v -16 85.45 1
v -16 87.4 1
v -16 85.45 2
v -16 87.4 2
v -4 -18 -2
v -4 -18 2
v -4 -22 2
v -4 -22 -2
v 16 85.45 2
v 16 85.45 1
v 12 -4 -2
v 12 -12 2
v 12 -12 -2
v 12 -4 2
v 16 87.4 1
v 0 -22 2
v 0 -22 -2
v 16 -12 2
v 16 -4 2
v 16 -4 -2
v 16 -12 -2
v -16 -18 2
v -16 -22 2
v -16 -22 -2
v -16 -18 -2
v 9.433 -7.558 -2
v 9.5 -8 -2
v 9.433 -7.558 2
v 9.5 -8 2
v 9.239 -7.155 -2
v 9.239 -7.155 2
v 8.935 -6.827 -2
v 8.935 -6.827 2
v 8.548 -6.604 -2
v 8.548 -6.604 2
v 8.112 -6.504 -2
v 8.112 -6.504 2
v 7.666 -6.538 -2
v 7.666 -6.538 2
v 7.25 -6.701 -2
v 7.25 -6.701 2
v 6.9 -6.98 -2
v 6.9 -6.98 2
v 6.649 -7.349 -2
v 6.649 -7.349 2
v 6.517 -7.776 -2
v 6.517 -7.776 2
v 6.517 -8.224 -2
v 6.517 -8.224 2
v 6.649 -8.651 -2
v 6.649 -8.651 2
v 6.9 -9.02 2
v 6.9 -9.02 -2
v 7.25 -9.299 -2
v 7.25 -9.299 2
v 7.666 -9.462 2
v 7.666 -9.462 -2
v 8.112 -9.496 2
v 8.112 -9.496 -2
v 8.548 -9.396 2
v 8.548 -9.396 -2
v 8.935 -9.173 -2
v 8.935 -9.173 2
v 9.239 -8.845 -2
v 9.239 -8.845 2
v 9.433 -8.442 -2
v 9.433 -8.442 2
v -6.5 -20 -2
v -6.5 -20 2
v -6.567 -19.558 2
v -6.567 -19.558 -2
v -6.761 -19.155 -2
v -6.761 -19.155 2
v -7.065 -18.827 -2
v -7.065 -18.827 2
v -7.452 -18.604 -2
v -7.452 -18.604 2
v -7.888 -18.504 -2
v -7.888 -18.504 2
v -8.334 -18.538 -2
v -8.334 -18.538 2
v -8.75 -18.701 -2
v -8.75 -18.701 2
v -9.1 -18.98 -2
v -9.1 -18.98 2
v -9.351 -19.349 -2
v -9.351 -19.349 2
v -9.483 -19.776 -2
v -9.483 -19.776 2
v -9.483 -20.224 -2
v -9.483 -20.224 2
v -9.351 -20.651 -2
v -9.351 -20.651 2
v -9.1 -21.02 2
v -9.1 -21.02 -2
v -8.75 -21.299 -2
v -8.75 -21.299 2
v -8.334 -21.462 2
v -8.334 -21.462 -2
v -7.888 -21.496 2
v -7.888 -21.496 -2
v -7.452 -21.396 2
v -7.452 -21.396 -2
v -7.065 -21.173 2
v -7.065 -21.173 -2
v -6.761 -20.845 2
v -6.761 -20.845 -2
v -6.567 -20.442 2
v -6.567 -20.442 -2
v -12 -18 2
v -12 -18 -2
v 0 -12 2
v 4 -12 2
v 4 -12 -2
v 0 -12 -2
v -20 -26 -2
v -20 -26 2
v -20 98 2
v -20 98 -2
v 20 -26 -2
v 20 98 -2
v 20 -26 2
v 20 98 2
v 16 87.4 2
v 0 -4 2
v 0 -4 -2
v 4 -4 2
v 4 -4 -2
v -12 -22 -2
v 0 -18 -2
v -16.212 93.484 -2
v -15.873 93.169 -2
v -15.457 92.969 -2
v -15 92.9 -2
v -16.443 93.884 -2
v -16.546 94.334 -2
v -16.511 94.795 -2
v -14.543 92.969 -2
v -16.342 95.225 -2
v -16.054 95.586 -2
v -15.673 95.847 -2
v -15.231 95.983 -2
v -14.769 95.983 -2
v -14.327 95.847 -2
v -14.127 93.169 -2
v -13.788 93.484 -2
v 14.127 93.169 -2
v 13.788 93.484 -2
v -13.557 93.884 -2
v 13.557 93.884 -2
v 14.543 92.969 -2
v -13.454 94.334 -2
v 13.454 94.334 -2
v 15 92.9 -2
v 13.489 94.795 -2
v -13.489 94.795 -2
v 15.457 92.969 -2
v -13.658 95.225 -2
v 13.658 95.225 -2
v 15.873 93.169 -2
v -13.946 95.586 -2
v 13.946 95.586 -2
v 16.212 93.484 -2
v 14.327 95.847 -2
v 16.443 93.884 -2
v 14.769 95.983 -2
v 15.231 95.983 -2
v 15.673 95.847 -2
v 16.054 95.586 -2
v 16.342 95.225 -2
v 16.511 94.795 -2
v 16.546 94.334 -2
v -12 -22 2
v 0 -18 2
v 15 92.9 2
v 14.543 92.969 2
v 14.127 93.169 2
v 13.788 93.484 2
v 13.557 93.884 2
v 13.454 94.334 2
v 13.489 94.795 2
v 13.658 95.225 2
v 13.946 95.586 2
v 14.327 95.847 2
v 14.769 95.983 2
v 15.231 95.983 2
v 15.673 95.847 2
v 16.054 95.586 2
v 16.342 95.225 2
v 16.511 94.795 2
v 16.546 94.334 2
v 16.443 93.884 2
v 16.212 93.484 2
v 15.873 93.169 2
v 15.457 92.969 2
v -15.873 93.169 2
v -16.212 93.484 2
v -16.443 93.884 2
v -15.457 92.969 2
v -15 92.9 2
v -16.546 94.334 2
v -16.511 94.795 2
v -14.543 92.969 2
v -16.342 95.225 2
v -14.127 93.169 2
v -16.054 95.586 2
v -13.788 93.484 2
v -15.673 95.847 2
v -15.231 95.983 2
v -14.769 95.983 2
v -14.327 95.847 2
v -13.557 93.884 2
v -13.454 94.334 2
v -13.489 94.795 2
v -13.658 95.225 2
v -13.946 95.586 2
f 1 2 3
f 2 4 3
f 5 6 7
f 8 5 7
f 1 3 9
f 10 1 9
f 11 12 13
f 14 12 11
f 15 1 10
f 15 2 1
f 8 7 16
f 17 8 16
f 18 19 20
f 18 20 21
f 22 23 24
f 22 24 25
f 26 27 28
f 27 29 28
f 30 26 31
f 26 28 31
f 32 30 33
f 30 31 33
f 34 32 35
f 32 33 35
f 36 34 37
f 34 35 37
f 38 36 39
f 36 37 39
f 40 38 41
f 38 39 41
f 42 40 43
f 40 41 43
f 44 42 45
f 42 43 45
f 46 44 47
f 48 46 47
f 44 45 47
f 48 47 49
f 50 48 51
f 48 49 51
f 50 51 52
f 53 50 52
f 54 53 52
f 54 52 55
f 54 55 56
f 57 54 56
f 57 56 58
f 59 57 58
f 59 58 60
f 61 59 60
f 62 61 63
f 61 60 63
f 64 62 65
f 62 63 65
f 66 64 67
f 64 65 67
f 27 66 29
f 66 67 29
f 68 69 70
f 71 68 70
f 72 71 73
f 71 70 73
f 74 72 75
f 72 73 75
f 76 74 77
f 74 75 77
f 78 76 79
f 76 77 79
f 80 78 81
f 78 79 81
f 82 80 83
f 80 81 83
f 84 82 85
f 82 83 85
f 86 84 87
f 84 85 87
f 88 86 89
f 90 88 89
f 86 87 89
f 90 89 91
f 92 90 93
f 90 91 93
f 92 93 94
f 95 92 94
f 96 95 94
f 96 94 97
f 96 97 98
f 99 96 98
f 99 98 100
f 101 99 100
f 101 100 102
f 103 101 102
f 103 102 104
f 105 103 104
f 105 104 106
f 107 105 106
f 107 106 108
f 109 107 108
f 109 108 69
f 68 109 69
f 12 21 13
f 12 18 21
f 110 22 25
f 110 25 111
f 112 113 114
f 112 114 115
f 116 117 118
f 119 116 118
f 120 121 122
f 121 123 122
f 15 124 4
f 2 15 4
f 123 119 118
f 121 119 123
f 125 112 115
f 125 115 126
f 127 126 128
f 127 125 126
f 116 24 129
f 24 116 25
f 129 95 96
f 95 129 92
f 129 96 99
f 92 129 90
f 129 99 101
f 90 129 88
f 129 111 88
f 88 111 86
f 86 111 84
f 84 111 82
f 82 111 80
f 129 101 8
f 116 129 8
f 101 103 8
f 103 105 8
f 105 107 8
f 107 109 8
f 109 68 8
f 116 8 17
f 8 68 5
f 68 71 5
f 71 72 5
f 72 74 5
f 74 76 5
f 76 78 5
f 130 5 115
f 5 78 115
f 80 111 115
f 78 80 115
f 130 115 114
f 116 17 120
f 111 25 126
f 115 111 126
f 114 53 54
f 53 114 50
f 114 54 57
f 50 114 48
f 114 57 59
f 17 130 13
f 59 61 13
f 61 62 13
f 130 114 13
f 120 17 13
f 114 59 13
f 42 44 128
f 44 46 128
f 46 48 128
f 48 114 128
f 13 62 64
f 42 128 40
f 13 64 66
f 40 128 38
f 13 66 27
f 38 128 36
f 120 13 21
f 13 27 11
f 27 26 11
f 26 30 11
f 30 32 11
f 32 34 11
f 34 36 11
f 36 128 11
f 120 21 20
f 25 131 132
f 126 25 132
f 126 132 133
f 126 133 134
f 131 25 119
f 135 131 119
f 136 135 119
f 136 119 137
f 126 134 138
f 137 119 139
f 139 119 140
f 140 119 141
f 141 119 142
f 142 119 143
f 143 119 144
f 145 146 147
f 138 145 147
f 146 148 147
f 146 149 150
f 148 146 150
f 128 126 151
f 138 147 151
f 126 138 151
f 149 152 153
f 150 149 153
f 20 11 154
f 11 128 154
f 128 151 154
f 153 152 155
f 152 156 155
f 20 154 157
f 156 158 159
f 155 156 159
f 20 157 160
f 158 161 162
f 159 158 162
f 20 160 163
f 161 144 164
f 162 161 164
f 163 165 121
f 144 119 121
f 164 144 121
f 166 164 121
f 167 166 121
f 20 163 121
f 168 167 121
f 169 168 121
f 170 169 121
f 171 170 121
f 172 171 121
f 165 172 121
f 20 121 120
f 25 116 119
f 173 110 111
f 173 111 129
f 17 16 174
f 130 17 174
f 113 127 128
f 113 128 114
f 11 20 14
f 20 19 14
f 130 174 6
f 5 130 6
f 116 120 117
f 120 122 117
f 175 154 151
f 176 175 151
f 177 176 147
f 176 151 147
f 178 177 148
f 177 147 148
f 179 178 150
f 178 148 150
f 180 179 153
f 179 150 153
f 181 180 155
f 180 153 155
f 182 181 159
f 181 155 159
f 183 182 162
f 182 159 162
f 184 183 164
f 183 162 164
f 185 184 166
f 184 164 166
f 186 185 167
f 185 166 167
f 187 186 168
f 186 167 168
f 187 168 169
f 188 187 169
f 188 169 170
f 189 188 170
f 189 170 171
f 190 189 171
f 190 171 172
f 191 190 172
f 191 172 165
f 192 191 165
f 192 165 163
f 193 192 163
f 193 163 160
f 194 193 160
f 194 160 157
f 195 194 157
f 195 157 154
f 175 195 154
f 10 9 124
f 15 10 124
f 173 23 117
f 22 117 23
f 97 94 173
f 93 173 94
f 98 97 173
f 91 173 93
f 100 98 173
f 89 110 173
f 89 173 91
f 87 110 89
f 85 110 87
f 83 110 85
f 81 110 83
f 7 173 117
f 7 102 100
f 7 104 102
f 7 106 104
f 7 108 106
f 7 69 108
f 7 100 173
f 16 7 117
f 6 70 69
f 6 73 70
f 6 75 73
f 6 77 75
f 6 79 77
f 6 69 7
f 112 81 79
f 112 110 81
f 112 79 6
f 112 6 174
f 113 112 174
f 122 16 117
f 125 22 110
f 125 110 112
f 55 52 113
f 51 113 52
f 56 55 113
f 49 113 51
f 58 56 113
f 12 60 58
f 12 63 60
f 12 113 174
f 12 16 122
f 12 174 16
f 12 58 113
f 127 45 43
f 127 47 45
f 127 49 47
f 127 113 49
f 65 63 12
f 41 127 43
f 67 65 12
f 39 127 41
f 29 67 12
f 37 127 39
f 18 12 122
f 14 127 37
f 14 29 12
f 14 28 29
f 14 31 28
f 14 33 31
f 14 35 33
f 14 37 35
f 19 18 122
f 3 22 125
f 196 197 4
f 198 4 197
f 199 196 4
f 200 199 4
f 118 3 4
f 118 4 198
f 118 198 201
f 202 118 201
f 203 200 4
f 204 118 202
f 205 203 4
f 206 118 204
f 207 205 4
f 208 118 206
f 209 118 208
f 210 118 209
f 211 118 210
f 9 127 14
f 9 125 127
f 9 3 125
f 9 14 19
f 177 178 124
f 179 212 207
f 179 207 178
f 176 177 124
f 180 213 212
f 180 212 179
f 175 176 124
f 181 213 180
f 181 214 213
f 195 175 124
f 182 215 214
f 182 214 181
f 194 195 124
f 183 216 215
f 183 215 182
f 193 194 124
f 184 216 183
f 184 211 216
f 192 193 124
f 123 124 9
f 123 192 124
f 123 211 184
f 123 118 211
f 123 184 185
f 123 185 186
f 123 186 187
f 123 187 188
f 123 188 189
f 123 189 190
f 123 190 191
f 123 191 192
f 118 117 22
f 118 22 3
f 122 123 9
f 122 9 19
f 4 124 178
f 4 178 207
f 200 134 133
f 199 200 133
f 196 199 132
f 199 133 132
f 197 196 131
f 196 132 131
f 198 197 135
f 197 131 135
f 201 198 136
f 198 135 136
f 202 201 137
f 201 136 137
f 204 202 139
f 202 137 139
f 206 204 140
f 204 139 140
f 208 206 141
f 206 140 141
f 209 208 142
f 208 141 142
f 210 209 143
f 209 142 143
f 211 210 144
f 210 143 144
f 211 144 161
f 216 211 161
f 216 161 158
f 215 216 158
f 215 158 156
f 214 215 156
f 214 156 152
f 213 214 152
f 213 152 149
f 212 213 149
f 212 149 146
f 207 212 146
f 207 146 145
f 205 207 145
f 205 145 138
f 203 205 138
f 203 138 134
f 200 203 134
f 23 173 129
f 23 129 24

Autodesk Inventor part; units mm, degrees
ref_plane "YZ Plane" through (0, 0, 0) normal (1, 0, 0) x (0, 1, 0)
ref_plane "XZ Plane" through (0, 0, 0) normal (0, 1, 0) x (-1, 0, 0)
ref_plane "XY Plane" through (0, 0, 0) normal (0, 0, 1) x (1, 0, 0)
sketch "Sketch1" plane through (0, 0, 0) normal (0, 1, 0) x (-1, 0, 0)
  line L0 (20, 2) -> (-20, 2)
  line L1 (-20, 2) -> (-20, -2)
  line L2 (-20, -2) -> (20, -2)
  line L3 (20, -2) -> (20, 2)
  line L4 (20, 2) -> (-20, -2) construction
  line L5 (-20, 2) -> (20, -2) construction
  point P0 (0, 0)
  dimension "d0" = 40
  dimension "d1" = 4
extrude "Extrusion1" add sketch "Sketch1" along normal blind 84
sketch "Sketch2" plane through (0, 84, 0) normal (0, 1, 0) x (1, 0, 0)
  line L0 (20, 2) -> (-20, 2) projected
  line L1 (20, -2) -> (20, 2) projected
  line L2 (20, 2) -> (-20, 2) projected
  line L3 (-20, 2) -> (-20, -2) projected
  line L4 (-20, -2) -> (20, -2) projected
  point P0 (0, 0)
extrude "Extrusion2" add sketch "Sketch2" along normal blind 14
sketch "Sketch3" plane through (-20, 0, 2) normal (0, 0, 1) x (1, 0, 0)
  line L0 (0, 98) -> (40, 98) projected
  line L1 (20, 98) -> (20, 0)
  line L2 (40, 0) -> (0, 0) projected
  point P0 (5, 94.45)
  point P1 (35, 94.45)
  dimension "d6" = 3.55
  dimension "d7" = 30
hole "Hole1" at (-15, 94.45, 2) at (15, 94.45, 2) direction (0, 0, -1) diameter 3.1 depth 4
sketch "Sketch4" plane through (-20, 0, 2) normal (0, 0, 1) x (1, 0, 0)
  line L0 (4, 85.45) -> (36, 85.45)
  circle A0 centre (5, 94.45) radius 1.55 projected
  circle A1 centre (35, 94.45) radius 1.55 projected
  line L1 (0, 0) -> (40, 0) projected
  line L2 (40, 0) -> (40, 98) projected
  line L3 (0, 98) -> (40, 98) projected
  line L4 (0, 0) -> (0, 98) projected
  line L5 (40, 0) -> (40, 98) projected
  line L6 (4, 85.45) -> (36, 85.45)
  line L7 (36, 85.45) -> (36, 87.4)
  line L8 (36, 87.4) -> (4, 87.4)
  line L9 (4, 87.4) -> (4, 85.45)
  line L10 (0, 98) -> (40, 98) projected
  point P0 (20, 0)
  point P1 (20, 98)
  point P2 (20, 85.45)
  point P3 (0, 87.4)
  point P4 (40, 87.4)
  point P5 (37.1403, 85.45)
  point P6 (20, 98)
  dimension "d16" = 1.95
  dimension "d33" = 12.55
  dimension "d44" = 4
extrude "IndicatorBar" cut sketch "Sketch4" against normal blind 1 contours L9 L8 L7 L0
sketch "Sketch6" plane through (-20, 0, 2) normal (0, 0, 1) x (1, 0, 0)
  line L0 (40, 0) -> (0, 0) projected
  line L1 (0, 0) -> (40, 0)
  line L2 (40, 0) -> (40, -26)
  line L3 (40, -26) -> (0, -26)
  line L4 (0, -26) -> (0, 0)
  line L5 (40, 0) -> (40, 98) projected
  line L6 (20, -4) -> (24, -4)
  line L7 (24, -4) -> (24, -8)
  line L8 (24, -8) -> (20, -8)
  line L9 (20, -8) -> (20, -4)
  line L10 (32, -8) -> (36, -8)
  line L11 (36, -8) -> (36, -4)
  line L12 (36, -4) -> (32, -4)
  line L13 (32, -4) -> (32, -8)
  line L14 (4, -18) -> (8, -18)
  line L15 (8, -18) -> (8, -22)
  line L16 (8, -22) -> (4, -22)
  line L17 (4, -22) -> (4, -18)
  line L18 (16, -22) -> (20, -22)
  line L19 (20, -22) -> (20, -18)
  line L20 (20, -18) -> (16, -18)
  line L21 (16, -18) -> (16, -22)
  circle A0 centre (12, -20) radius 1.5
  line L22 (8, -18) -> (16, -22) construction
  line L23 (20, -8) -> (24, -8)
  line L24 (24, -8) -> (24, -12)
  line L25 (24, -12) -> (20, -12)
  line L26 (20, -12) -> (20, -8)
  line L27 (32, -8) -> (36, -8)
  line L28 (36, -8) -> (36, -12)
  line L29 (36, -12) -> (32, -12)
  line L30 (32, -12) -> (32, -8)
  line L31 (24, -4) -> (32, -12) construction
  circle A1 centre (28, -8) radius 1.5
  point P0 (20, 0)
  point P1 (40, 85.45)
  point P2 (36, -6)
  point P3 (8, -20)
  point P4 (6, -22)
  point P5 (4, -20)
  point P6 (20, -4)
  point P7 (20, -12)
  point P8 (18, -18)
  point P9 (32, -10)
  dimension "d24" = 4
  dimension "d25" = 4
  dimension "d26" = 4
  dimension "d28" = 4
  dimension "d29" = 4
  dimension "d30" = 4
  dimension "d34" = 4
  dimension "d35" = 4
  dimension "d36" = 3
  dimension "d37" = 10
  dimension "d38" = 4
  dimension "d39" = 4
  dimension "d40" = 4
  dimension "d41" = 4
  dimension "d43" = 3
extrude "UnderCar" add sketch "Sketch6" against normal blind 4
properties part number "Door_V2" material "MDF Medium Density Fiberboard"
